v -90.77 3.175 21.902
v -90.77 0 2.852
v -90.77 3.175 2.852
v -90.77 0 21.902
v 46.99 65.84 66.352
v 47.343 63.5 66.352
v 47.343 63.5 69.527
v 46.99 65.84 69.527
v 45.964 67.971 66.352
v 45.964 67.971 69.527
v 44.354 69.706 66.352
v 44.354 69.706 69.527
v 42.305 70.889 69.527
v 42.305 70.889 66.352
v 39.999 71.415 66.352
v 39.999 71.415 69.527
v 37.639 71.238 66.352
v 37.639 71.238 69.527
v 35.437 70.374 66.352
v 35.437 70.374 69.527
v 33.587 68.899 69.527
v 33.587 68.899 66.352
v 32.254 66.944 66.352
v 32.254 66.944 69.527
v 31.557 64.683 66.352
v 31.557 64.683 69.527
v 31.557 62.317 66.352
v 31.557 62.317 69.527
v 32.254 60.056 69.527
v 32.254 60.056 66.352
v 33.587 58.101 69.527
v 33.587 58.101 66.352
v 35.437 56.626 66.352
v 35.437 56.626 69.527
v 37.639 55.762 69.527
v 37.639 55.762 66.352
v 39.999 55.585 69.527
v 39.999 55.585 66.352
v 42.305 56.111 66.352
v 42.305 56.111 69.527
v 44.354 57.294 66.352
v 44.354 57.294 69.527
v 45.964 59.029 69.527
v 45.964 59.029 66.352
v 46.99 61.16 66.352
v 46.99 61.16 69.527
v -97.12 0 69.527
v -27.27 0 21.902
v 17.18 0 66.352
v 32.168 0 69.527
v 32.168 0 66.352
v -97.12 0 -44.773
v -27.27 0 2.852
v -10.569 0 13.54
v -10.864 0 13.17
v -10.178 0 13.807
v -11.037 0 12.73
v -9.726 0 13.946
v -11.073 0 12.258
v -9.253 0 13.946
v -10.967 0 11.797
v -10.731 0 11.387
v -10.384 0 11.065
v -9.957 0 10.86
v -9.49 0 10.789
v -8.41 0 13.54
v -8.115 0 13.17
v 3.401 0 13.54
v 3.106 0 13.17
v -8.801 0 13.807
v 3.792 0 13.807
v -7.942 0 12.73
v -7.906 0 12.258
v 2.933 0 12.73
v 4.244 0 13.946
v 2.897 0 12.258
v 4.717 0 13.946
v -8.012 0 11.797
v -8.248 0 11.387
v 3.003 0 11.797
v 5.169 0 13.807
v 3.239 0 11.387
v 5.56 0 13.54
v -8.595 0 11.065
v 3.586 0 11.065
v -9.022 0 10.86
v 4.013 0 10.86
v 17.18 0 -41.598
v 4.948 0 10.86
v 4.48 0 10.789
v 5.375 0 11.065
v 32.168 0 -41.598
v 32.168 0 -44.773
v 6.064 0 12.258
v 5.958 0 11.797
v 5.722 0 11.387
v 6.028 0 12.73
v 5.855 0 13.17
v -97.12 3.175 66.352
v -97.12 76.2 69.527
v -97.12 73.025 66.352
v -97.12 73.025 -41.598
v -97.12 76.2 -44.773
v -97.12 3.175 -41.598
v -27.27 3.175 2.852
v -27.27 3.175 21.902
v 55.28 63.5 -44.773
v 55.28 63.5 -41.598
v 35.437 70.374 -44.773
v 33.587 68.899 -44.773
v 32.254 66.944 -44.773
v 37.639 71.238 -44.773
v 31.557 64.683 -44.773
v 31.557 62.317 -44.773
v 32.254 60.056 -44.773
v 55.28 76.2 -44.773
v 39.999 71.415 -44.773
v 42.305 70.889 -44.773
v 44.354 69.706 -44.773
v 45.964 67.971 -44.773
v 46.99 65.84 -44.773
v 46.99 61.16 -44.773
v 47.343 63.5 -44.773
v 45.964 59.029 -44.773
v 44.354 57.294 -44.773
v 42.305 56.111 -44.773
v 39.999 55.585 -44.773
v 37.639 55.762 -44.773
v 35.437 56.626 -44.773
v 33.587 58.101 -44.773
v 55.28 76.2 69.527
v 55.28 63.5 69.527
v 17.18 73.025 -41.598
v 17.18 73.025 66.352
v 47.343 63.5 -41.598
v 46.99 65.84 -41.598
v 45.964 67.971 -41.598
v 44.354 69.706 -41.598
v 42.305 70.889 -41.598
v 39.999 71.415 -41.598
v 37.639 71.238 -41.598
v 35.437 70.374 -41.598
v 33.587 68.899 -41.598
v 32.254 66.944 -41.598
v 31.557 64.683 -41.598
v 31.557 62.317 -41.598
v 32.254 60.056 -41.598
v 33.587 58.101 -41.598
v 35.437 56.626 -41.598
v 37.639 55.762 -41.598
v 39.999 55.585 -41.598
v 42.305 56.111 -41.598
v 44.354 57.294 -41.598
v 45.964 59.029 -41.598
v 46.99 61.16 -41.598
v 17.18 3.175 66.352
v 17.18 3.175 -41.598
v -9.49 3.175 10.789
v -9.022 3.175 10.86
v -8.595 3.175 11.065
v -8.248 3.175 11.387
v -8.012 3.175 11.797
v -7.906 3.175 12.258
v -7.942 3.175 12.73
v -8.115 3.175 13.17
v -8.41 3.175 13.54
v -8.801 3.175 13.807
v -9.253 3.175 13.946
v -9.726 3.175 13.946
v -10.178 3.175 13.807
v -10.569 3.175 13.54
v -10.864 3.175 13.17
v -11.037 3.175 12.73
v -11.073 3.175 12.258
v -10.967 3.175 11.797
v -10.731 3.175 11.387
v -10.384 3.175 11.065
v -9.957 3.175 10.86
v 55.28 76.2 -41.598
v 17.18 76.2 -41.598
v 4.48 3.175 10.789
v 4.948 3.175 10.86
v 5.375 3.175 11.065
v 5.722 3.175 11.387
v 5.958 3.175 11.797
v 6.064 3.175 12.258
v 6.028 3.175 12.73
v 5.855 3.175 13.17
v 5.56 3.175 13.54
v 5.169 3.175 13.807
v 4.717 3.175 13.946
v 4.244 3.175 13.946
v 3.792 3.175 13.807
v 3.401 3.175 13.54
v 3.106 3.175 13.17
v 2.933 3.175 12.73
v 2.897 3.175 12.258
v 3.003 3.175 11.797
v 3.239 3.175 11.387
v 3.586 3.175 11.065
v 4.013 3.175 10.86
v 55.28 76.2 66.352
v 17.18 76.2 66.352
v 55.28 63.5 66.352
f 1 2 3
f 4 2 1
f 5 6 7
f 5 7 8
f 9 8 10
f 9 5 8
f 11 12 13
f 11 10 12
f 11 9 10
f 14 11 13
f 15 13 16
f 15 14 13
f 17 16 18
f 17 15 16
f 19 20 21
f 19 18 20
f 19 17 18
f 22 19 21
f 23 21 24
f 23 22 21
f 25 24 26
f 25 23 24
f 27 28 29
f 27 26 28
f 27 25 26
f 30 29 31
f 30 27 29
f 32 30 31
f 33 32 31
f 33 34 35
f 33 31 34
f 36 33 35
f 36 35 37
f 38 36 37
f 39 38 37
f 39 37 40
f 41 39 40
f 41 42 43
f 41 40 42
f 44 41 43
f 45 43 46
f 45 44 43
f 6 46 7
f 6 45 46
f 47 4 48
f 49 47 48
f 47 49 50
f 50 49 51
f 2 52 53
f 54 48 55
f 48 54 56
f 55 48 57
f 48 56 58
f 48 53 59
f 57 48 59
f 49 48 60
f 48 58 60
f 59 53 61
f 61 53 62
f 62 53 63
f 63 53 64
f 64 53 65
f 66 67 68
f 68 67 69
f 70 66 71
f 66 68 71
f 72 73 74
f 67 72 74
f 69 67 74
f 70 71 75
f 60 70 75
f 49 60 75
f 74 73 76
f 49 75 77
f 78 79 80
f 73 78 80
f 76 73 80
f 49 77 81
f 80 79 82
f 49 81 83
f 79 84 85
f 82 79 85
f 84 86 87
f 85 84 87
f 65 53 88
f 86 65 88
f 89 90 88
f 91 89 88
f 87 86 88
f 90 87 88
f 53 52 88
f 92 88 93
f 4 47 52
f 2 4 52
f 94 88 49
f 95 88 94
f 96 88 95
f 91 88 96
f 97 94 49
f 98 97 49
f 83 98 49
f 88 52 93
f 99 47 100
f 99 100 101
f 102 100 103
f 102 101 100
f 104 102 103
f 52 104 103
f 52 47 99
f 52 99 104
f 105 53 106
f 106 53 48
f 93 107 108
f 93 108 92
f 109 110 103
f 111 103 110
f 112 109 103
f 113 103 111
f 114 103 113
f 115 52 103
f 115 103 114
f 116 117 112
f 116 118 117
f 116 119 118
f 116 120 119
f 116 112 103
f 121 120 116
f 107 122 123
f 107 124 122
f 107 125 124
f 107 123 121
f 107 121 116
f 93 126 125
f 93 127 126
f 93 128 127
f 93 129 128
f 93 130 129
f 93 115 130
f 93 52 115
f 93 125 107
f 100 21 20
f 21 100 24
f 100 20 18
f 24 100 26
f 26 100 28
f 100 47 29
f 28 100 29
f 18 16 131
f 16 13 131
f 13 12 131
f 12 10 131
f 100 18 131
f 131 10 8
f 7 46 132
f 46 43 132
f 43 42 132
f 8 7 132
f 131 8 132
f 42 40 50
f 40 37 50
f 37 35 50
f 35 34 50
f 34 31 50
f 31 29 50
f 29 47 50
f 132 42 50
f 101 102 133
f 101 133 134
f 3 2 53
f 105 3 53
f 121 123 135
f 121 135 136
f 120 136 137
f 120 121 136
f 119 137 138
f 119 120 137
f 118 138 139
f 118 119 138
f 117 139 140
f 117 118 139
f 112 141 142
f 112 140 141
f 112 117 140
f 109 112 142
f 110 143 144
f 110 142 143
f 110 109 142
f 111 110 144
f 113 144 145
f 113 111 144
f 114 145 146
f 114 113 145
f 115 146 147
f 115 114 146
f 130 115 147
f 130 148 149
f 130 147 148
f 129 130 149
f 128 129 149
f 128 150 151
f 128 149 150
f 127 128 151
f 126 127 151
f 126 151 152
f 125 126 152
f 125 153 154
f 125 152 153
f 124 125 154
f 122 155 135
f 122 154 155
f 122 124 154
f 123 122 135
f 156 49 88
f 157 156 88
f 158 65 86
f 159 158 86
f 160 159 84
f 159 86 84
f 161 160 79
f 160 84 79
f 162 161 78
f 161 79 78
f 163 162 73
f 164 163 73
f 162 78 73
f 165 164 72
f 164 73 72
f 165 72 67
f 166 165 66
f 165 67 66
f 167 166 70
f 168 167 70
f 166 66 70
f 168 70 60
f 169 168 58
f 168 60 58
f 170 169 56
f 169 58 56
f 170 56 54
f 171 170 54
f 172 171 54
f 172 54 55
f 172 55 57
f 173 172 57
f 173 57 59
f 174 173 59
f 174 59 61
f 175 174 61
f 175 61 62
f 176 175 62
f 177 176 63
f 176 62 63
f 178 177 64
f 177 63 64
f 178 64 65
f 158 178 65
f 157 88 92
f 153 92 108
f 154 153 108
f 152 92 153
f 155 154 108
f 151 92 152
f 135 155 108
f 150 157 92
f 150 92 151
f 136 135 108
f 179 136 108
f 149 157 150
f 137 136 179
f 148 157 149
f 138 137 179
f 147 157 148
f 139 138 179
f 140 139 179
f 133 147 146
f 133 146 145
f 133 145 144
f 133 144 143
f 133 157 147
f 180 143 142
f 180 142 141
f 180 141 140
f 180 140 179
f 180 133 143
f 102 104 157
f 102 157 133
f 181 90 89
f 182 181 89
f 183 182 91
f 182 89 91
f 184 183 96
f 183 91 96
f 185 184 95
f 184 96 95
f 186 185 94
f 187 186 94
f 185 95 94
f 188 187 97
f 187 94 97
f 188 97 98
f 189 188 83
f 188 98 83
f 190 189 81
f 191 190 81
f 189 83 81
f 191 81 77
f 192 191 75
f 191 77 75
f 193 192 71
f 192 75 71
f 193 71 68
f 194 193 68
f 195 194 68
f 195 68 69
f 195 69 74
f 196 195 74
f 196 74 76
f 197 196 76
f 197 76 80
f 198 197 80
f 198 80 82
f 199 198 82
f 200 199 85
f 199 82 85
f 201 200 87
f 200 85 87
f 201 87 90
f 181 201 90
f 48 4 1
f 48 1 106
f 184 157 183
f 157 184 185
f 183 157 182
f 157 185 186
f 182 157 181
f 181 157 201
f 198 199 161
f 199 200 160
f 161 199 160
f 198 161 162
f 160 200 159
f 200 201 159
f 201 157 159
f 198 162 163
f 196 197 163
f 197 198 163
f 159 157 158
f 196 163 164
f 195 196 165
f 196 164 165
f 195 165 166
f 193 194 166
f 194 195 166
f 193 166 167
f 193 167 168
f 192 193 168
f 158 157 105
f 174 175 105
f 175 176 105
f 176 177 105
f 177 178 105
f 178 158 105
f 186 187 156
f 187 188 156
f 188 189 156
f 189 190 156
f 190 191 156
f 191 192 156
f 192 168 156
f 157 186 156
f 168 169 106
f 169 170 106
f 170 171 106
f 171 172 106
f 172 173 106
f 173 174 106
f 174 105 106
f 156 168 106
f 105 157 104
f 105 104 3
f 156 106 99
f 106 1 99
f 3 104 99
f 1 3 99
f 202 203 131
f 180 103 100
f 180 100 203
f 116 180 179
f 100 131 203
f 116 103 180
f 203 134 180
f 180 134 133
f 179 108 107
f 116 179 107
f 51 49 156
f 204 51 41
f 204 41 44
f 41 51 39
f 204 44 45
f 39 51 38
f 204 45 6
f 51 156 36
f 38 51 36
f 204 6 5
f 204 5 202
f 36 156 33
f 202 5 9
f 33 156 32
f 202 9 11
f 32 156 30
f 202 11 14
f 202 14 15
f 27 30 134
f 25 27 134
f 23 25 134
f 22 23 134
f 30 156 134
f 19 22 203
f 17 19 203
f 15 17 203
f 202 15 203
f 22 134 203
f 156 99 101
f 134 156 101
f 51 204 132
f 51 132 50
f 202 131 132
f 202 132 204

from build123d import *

# Parameters (mm, degrees)
SKETCH1_W               = 152.4
SKETCH1_H               = 114.3
BOSS_EXTRUDE1_DEPTH     = 76.2
CUT_EXTRUDE1_DEPTH      = 142.677746119
CUT_EXTRUDE1_DEPTH_BACK = 142.677746119
SKETCH5_W               = 38.1
SKETCH5_H               = 107.95
CUT_EXTRUDE4_DEPTH      = 142.677746119
CUT_EXTRUDE5_DEPTH      = 169.235334824
CUT_EXTRUDE5_DEPTH_BACK = 169.235334824
SKETCH6_R               = 7.9375
SKETCH8_W               = 107.95
SKETCH8_H               = 69.85
CUT_EXTRUDE6_DEPTH      = 185.027568212
SKETCH9_R               = 1.5875
CUT_EXTRUDE7_DEPTH      = 3.175
SKETCH10_W              = 63.5
SKETCH10_H              = 19.05
CUT_EXTRUDE8_DEPTH      = 5.715


with BuildPart() as part:
    # Sketch1 → Boss-Extrude1 (new body)
    with BuildSketch(Plane(origin=(0, 0, 0), x_dir=(1, 0, 0), z_dir=(0, 1, 0))):
        with Locations((-20.919503106, -12.376583851)):
            Rectangle(SKETCH1_W, SKETCH1_H)
    extrude(amount=BOSS_EXTRUDE1_DEPTH)

    # Sketch3 → Cut-Extrude1 (cut, two sides: drawn at the far end of the back side and taken through both)
    with BuildSketch(Plane.XY.offset(-CUT_EXTRUDE1_DEPTH_BACK)):
        Polygon((55.280496894, 63.5), (32.168387019, 0), (55.280496894, 0), align=None)
    extrude(amount=CUT_EXTRUDE1_DEPTH + CUT_EXTRUDE1_DEPTH_BACK, mode=Mode.SUBTRACT)

    # Sketch5 → Cut-Extrude4 (cut, through all)
    with BuildSketch(Plane(origin=(0, 0, 0), x_dir=(1, 0, 0), z_dir=(0, 1, 0))):
        with Locations((36.230496894, -12.376583851)):
            Rectangle(SKETCH5_W, SKETCH5_H)
    extrude(amount=CUT_EXTRUDE4_DEPTH, mode=Mode.SUBTRACT)

    # Sketch6 → Cut-Extrude5 (cut, two sides: drawn at the far end of the back side and taken through both)
    with BuildSketch(Plane.XY.offset(69.526583851).offset(-CUT_EXTRUDE5_DEPTH_BACK)):
        with Locations((39.405496894, 63.5)):
            Circle(SKETCH6_R)
    extrude(amount=CUT_EXTRUDE5_DEPTH + CUT_EXTRUDE5_DEPTH_BACK, mode=Mode.SUBTRACT)

    # Sketch8 → Cut-Extrude6 (cut, through all)
    with BuildSketch(Plane.ZY.offset(97.119503106)):
        with Locations((12.376583851, 38.1)):
            Rectangle(SKETCH8_W, SKETCH8_H)
    extrude(amount=-CUT_EXTRUDE6_DEPTH, mode=Mode.SUBTRACT)

    # Sketch9 → Cut-Extrude7 (cut)
    with BuildSketch(Plane.XZ):
        with Locations(Location((4.480496894, 12.376583851, 0), (0, 0, 270))):
            Circle(SKETCH9_R)
        with Locations(Location((-9.489503106, 12.376583851, 0), (0, 0, 270))):
            Circle(SKETCH9_R)
    extrude(amount=-CUT_EXTRUDE7_DEPTH, mode=Mode.SUBTRACT)

    # Sketch10 → Cut-Extrude8 (cut)
    with BuildSketch(Plane.XZ):
        with Locations((-59.019503106, 12.376583851)):
            Rectangle(SKETCH10_W, SKETCH10_H)
    extrude(amount=-CUT_EXTRUDE8_DEPTH, mode=Mode.SUBTRACT)


solid = part.part
